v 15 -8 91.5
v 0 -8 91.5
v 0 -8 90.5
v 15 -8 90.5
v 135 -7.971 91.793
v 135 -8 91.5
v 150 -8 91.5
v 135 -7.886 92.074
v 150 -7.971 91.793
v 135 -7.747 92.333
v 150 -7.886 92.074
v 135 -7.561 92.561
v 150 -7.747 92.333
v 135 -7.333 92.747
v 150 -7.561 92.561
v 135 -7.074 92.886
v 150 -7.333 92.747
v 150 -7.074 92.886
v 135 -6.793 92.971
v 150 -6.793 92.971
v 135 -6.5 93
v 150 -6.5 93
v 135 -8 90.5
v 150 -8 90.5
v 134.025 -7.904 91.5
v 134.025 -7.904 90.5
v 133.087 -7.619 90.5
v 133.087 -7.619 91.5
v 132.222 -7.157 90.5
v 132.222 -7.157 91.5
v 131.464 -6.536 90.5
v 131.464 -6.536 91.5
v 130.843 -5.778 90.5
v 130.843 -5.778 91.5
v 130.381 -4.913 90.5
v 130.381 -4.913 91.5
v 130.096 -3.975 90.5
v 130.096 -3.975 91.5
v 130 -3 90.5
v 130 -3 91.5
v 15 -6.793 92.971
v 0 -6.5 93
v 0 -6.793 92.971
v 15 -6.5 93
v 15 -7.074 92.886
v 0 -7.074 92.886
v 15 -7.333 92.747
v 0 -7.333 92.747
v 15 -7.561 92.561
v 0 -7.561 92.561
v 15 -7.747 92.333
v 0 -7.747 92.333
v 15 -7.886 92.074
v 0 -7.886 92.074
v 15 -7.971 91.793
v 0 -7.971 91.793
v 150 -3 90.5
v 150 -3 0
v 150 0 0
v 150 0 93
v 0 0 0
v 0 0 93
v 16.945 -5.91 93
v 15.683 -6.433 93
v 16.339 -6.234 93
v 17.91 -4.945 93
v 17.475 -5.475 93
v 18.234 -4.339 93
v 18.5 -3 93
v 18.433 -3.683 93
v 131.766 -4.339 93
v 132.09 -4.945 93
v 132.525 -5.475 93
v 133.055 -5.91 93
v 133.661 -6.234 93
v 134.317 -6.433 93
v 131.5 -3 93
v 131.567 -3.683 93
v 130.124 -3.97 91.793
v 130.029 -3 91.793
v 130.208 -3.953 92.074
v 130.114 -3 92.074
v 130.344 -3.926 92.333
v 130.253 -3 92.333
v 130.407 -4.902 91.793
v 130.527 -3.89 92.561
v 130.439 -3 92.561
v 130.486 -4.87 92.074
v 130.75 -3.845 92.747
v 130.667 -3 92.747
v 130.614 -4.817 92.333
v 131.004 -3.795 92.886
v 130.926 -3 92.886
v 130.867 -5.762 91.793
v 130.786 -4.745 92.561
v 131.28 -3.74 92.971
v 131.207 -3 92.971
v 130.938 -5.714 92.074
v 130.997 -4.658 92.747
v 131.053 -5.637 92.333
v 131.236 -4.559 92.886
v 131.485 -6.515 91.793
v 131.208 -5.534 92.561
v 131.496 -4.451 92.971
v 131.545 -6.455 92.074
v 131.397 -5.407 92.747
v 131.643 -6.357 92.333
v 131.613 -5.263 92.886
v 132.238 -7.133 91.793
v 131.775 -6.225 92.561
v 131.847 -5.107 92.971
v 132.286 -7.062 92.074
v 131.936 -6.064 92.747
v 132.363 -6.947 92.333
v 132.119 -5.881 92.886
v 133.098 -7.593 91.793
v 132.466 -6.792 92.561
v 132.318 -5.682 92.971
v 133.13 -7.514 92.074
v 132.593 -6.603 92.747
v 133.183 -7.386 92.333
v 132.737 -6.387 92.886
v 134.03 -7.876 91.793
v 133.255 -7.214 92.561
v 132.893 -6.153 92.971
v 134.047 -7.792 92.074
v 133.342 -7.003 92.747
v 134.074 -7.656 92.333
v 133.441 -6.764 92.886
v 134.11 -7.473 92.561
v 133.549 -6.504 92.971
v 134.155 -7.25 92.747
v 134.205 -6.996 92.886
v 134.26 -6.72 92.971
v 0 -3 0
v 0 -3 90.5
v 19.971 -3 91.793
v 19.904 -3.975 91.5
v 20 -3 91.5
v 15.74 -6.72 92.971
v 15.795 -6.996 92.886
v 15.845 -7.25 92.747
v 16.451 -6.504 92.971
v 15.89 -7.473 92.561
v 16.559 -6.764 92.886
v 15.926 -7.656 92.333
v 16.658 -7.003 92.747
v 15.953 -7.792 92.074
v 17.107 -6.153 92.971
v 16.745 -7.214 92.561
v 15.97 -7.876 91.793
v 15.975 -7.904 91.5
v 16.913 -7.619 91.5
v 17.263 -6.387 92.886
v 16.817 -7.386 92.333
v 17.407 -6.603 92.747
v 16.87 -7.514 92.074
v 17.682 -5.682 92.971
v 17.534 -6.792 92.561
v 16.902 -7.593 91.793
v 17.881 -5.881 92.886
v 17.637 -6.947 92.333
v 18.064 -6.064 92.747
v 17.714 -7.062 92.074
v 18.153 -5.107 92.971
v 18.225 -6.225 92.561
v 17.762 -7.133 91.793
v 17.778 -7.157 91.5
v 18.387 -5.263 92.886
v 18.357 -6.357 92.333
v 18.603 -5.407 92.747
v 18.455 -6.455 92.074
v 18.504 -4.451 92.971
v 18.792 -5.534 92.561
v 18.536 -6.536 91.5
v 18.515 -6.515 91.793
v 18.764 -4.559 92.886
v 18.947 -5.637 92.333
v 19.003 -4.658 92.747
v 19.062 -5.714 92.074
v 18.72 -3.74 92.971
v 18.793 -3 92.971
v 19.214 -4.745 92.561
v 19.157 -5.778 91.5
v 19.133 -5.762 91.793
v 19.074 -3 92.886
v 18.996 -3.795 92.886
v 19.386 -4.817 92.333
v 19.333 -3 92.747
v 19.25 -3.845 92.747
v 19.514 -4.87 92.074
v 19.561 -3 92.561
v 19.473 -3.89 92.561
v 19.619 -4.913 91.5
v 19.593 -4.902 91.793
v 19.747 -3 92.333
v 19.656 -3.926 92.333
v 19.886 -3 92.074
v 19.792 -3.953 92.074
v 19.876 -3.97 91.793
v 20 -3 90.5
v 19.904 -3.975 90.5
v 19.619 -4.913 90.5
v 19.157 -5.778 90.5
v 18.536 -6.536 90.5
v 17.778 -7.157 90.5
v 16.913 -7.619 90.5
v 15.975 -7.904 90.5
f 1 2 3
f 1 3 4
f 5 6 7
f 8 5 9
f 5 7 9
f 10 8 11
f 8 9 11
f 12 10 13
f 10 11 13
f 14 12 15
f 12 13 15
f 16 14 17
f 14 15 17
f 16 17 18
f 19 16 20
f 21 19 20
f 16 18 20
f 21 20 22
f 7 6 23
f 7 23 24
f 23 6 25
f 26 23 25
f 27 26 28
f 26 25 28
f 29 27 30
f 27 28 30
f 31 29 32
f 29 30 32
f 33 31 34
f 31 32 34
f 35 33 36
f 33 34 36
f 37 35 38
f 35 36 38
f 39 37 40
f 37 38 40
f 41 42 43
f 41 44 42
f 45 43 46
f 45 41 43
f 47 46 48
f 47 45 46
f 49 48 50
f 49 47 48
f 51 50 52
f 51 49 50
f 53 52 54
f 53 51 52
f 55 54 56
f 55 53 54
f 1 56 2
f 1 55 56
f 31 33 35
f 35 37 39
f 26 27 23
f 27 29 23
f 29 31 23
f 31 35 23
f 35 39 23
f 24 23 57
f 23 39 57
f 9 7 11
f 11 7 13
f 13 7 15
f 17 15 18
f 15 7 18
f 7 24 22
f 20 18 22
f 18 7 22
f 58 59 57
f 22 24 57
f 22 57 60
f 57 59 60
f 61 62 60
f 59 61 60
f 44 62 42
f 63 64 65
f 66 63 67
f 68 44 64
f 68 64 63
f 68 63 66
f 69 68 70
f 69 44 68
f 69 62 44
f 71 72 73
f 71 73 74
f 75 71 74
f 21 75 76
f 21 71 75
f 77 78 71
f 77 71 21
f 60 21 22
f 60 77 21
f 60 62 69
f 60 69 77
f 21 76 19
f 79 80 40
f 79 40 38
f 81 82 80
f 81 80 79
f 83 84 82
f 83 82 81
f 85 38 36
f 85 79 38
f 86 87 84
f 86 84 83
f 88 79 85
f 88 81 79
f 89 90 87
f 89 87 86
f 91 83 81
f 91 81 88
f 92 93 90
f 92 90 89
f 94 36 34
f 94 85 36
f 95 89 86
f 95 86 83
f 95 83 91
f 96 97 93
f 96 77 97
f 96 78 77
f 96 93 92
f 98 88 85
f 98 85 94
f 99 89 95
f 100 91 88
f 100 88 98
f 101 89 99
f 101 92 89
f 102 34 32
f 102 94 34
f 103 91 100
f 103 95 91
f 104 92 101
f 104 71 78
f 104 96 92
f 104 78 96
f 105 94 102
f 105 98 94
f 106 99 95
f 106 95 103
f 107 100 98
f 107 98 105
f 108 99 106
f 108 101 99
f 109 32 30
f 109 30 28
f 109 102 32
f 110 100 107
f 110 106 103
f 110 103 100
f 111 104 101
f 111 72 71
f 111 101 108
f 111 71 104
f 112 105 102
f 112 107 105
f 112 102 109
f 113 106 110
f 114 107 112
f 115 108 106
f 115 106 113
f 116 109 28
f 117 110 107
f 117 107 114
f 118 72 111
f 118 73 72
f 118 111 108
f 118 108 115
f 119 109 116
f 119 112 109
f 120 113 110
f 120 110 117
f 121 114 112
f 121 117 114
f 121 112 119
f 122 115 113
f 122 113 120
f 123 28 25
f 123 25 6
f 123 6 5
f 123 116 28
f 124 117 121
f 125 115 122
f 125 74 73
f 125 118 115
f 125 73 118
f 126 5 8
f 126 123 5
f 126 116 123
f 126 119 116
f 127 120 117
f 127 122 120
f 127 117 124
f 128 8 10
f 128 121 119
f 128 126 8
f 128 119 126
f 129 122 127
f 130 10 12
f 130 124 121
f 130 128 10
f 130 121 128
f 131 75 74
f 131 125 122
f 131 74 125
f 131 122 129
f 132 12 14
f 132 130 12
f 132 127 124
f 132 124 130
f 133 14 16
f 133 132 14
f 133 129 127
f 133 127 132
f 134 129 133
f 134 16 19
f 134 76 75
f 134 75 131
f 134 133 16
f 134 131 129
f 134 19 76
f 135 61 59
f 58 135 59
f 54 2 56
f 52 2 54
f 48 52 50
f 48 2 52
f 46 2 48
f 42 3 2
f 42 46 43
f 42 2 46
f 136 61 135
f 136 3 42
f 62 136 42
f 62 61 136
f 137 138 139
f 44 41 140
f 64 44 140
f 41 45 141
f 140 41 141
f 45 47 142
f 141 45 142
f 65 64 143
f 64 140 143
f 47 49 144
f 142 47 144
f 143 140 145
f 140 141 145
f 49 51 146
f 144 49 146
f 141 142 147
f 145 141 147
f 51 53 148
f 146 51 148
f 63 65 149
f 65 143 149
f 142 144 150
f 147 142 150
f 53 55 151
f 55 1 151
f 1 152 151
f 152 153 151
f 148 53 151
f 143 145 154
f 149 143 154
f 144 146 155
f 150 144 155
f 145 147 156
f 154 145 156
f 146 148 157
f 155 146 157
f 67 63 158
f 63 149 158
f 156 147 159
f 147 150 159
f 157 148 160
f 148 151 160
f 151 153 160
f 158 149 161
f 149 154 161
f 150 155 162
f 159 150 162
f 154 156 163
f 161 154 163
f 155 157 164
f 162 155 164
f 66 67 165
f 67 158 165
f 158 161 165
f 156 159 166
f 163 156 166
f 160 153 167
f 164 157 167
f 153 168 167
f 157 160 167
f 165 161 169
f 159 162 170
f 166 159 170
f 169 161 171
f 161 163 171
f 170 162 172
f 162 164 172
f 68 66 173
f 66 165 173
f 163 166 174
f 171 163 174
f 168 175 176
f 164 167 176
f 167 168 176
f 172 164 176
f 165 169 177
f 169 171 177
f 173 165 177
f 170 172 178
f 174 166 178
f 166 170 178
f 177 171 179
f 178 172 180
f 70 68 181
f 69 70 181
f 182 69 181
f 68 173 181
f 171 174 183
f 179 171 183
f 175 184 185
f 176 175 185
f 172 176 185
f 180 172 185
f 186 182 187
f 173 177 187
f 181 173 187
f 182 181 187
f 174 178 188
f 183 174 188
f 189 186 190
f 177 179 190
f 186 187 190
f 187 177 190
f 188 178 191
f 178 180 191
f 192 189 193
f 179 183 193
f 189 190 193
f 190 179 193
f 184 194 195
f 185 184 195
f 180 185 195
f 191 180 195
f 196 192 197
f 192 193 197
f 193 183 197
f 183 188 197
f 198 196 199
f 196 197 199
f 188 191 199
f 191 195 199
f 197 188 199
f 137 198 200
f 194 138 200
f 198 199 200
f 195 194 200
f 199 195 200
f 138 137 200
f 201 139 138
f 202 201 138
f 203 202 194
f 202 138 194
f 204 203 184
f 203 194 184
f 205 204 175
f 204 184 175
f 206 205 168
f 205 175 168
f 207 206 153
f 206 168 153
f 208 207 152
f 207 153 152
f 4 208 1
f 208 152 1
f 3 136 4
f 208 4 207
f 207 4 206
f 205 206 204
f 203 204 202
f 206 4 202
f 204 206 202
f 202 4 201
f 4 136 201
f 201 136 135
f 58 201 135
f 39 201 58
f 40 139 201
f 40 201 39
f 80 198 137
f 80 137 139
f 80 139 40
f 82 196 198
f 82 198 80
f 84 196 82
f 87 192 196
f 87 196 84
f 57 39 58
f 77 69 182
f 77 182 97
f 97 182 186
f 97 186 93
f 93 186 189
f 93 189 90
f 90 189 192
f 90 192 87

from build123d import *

# Parameters (mm, degrees)
F0_W     = 150
F0_H     = 93
F1_DEPTH = 3
F2_W     = 20
F2_H     = 2.5
F3_DEPTH = 5
F4_R     = 4.99999
F5_R     = 1.5


# Not quite as in the source:
# - a fillet or chamfer is up to 0.001 mm smaller than in the source, because OpenCascade refuses the exact size


with BuildPart() as f1:
    # F0 (on Front) → F1 (new body)
    with BuildSketch(Plane.XZ):
        with Locations((75, 46.5)):
            Rectangle(F0_W, F0_H)
    extrude(amount=F1_DEPTH)

    # F2 (on face) → F3 (join)
    with BuildSketch(Plane.XZ.offset(3)):
        with Locations((10, 91.75)):
            Rectangle(F2_W, F2_H)
        with Locations((140, 91.75)):
            Rectangle(F2_W, F2_H)
    extrude(amount=F3_DEPTH)

    # F4 (radius 5 in the source; OpenCascade refuses exactly that, so slightly less here)
    f4_edges = [f1.edges().sort_by_distance(p)[0] for p in [
        (20, -8, 91.75),
        (130, -8, 91.75),
    ]]
    fillet(f4_edges, radius=F4_R)

    # F5
    f5_edges = [f1.edges().sort_by_distance(p)[0] for p in [
        (7.500005, -8, 93),
        (142.499995, -8, 93),
    ]]
    fillet(f5_edges, radius=F5_R)


solid = f1.part
